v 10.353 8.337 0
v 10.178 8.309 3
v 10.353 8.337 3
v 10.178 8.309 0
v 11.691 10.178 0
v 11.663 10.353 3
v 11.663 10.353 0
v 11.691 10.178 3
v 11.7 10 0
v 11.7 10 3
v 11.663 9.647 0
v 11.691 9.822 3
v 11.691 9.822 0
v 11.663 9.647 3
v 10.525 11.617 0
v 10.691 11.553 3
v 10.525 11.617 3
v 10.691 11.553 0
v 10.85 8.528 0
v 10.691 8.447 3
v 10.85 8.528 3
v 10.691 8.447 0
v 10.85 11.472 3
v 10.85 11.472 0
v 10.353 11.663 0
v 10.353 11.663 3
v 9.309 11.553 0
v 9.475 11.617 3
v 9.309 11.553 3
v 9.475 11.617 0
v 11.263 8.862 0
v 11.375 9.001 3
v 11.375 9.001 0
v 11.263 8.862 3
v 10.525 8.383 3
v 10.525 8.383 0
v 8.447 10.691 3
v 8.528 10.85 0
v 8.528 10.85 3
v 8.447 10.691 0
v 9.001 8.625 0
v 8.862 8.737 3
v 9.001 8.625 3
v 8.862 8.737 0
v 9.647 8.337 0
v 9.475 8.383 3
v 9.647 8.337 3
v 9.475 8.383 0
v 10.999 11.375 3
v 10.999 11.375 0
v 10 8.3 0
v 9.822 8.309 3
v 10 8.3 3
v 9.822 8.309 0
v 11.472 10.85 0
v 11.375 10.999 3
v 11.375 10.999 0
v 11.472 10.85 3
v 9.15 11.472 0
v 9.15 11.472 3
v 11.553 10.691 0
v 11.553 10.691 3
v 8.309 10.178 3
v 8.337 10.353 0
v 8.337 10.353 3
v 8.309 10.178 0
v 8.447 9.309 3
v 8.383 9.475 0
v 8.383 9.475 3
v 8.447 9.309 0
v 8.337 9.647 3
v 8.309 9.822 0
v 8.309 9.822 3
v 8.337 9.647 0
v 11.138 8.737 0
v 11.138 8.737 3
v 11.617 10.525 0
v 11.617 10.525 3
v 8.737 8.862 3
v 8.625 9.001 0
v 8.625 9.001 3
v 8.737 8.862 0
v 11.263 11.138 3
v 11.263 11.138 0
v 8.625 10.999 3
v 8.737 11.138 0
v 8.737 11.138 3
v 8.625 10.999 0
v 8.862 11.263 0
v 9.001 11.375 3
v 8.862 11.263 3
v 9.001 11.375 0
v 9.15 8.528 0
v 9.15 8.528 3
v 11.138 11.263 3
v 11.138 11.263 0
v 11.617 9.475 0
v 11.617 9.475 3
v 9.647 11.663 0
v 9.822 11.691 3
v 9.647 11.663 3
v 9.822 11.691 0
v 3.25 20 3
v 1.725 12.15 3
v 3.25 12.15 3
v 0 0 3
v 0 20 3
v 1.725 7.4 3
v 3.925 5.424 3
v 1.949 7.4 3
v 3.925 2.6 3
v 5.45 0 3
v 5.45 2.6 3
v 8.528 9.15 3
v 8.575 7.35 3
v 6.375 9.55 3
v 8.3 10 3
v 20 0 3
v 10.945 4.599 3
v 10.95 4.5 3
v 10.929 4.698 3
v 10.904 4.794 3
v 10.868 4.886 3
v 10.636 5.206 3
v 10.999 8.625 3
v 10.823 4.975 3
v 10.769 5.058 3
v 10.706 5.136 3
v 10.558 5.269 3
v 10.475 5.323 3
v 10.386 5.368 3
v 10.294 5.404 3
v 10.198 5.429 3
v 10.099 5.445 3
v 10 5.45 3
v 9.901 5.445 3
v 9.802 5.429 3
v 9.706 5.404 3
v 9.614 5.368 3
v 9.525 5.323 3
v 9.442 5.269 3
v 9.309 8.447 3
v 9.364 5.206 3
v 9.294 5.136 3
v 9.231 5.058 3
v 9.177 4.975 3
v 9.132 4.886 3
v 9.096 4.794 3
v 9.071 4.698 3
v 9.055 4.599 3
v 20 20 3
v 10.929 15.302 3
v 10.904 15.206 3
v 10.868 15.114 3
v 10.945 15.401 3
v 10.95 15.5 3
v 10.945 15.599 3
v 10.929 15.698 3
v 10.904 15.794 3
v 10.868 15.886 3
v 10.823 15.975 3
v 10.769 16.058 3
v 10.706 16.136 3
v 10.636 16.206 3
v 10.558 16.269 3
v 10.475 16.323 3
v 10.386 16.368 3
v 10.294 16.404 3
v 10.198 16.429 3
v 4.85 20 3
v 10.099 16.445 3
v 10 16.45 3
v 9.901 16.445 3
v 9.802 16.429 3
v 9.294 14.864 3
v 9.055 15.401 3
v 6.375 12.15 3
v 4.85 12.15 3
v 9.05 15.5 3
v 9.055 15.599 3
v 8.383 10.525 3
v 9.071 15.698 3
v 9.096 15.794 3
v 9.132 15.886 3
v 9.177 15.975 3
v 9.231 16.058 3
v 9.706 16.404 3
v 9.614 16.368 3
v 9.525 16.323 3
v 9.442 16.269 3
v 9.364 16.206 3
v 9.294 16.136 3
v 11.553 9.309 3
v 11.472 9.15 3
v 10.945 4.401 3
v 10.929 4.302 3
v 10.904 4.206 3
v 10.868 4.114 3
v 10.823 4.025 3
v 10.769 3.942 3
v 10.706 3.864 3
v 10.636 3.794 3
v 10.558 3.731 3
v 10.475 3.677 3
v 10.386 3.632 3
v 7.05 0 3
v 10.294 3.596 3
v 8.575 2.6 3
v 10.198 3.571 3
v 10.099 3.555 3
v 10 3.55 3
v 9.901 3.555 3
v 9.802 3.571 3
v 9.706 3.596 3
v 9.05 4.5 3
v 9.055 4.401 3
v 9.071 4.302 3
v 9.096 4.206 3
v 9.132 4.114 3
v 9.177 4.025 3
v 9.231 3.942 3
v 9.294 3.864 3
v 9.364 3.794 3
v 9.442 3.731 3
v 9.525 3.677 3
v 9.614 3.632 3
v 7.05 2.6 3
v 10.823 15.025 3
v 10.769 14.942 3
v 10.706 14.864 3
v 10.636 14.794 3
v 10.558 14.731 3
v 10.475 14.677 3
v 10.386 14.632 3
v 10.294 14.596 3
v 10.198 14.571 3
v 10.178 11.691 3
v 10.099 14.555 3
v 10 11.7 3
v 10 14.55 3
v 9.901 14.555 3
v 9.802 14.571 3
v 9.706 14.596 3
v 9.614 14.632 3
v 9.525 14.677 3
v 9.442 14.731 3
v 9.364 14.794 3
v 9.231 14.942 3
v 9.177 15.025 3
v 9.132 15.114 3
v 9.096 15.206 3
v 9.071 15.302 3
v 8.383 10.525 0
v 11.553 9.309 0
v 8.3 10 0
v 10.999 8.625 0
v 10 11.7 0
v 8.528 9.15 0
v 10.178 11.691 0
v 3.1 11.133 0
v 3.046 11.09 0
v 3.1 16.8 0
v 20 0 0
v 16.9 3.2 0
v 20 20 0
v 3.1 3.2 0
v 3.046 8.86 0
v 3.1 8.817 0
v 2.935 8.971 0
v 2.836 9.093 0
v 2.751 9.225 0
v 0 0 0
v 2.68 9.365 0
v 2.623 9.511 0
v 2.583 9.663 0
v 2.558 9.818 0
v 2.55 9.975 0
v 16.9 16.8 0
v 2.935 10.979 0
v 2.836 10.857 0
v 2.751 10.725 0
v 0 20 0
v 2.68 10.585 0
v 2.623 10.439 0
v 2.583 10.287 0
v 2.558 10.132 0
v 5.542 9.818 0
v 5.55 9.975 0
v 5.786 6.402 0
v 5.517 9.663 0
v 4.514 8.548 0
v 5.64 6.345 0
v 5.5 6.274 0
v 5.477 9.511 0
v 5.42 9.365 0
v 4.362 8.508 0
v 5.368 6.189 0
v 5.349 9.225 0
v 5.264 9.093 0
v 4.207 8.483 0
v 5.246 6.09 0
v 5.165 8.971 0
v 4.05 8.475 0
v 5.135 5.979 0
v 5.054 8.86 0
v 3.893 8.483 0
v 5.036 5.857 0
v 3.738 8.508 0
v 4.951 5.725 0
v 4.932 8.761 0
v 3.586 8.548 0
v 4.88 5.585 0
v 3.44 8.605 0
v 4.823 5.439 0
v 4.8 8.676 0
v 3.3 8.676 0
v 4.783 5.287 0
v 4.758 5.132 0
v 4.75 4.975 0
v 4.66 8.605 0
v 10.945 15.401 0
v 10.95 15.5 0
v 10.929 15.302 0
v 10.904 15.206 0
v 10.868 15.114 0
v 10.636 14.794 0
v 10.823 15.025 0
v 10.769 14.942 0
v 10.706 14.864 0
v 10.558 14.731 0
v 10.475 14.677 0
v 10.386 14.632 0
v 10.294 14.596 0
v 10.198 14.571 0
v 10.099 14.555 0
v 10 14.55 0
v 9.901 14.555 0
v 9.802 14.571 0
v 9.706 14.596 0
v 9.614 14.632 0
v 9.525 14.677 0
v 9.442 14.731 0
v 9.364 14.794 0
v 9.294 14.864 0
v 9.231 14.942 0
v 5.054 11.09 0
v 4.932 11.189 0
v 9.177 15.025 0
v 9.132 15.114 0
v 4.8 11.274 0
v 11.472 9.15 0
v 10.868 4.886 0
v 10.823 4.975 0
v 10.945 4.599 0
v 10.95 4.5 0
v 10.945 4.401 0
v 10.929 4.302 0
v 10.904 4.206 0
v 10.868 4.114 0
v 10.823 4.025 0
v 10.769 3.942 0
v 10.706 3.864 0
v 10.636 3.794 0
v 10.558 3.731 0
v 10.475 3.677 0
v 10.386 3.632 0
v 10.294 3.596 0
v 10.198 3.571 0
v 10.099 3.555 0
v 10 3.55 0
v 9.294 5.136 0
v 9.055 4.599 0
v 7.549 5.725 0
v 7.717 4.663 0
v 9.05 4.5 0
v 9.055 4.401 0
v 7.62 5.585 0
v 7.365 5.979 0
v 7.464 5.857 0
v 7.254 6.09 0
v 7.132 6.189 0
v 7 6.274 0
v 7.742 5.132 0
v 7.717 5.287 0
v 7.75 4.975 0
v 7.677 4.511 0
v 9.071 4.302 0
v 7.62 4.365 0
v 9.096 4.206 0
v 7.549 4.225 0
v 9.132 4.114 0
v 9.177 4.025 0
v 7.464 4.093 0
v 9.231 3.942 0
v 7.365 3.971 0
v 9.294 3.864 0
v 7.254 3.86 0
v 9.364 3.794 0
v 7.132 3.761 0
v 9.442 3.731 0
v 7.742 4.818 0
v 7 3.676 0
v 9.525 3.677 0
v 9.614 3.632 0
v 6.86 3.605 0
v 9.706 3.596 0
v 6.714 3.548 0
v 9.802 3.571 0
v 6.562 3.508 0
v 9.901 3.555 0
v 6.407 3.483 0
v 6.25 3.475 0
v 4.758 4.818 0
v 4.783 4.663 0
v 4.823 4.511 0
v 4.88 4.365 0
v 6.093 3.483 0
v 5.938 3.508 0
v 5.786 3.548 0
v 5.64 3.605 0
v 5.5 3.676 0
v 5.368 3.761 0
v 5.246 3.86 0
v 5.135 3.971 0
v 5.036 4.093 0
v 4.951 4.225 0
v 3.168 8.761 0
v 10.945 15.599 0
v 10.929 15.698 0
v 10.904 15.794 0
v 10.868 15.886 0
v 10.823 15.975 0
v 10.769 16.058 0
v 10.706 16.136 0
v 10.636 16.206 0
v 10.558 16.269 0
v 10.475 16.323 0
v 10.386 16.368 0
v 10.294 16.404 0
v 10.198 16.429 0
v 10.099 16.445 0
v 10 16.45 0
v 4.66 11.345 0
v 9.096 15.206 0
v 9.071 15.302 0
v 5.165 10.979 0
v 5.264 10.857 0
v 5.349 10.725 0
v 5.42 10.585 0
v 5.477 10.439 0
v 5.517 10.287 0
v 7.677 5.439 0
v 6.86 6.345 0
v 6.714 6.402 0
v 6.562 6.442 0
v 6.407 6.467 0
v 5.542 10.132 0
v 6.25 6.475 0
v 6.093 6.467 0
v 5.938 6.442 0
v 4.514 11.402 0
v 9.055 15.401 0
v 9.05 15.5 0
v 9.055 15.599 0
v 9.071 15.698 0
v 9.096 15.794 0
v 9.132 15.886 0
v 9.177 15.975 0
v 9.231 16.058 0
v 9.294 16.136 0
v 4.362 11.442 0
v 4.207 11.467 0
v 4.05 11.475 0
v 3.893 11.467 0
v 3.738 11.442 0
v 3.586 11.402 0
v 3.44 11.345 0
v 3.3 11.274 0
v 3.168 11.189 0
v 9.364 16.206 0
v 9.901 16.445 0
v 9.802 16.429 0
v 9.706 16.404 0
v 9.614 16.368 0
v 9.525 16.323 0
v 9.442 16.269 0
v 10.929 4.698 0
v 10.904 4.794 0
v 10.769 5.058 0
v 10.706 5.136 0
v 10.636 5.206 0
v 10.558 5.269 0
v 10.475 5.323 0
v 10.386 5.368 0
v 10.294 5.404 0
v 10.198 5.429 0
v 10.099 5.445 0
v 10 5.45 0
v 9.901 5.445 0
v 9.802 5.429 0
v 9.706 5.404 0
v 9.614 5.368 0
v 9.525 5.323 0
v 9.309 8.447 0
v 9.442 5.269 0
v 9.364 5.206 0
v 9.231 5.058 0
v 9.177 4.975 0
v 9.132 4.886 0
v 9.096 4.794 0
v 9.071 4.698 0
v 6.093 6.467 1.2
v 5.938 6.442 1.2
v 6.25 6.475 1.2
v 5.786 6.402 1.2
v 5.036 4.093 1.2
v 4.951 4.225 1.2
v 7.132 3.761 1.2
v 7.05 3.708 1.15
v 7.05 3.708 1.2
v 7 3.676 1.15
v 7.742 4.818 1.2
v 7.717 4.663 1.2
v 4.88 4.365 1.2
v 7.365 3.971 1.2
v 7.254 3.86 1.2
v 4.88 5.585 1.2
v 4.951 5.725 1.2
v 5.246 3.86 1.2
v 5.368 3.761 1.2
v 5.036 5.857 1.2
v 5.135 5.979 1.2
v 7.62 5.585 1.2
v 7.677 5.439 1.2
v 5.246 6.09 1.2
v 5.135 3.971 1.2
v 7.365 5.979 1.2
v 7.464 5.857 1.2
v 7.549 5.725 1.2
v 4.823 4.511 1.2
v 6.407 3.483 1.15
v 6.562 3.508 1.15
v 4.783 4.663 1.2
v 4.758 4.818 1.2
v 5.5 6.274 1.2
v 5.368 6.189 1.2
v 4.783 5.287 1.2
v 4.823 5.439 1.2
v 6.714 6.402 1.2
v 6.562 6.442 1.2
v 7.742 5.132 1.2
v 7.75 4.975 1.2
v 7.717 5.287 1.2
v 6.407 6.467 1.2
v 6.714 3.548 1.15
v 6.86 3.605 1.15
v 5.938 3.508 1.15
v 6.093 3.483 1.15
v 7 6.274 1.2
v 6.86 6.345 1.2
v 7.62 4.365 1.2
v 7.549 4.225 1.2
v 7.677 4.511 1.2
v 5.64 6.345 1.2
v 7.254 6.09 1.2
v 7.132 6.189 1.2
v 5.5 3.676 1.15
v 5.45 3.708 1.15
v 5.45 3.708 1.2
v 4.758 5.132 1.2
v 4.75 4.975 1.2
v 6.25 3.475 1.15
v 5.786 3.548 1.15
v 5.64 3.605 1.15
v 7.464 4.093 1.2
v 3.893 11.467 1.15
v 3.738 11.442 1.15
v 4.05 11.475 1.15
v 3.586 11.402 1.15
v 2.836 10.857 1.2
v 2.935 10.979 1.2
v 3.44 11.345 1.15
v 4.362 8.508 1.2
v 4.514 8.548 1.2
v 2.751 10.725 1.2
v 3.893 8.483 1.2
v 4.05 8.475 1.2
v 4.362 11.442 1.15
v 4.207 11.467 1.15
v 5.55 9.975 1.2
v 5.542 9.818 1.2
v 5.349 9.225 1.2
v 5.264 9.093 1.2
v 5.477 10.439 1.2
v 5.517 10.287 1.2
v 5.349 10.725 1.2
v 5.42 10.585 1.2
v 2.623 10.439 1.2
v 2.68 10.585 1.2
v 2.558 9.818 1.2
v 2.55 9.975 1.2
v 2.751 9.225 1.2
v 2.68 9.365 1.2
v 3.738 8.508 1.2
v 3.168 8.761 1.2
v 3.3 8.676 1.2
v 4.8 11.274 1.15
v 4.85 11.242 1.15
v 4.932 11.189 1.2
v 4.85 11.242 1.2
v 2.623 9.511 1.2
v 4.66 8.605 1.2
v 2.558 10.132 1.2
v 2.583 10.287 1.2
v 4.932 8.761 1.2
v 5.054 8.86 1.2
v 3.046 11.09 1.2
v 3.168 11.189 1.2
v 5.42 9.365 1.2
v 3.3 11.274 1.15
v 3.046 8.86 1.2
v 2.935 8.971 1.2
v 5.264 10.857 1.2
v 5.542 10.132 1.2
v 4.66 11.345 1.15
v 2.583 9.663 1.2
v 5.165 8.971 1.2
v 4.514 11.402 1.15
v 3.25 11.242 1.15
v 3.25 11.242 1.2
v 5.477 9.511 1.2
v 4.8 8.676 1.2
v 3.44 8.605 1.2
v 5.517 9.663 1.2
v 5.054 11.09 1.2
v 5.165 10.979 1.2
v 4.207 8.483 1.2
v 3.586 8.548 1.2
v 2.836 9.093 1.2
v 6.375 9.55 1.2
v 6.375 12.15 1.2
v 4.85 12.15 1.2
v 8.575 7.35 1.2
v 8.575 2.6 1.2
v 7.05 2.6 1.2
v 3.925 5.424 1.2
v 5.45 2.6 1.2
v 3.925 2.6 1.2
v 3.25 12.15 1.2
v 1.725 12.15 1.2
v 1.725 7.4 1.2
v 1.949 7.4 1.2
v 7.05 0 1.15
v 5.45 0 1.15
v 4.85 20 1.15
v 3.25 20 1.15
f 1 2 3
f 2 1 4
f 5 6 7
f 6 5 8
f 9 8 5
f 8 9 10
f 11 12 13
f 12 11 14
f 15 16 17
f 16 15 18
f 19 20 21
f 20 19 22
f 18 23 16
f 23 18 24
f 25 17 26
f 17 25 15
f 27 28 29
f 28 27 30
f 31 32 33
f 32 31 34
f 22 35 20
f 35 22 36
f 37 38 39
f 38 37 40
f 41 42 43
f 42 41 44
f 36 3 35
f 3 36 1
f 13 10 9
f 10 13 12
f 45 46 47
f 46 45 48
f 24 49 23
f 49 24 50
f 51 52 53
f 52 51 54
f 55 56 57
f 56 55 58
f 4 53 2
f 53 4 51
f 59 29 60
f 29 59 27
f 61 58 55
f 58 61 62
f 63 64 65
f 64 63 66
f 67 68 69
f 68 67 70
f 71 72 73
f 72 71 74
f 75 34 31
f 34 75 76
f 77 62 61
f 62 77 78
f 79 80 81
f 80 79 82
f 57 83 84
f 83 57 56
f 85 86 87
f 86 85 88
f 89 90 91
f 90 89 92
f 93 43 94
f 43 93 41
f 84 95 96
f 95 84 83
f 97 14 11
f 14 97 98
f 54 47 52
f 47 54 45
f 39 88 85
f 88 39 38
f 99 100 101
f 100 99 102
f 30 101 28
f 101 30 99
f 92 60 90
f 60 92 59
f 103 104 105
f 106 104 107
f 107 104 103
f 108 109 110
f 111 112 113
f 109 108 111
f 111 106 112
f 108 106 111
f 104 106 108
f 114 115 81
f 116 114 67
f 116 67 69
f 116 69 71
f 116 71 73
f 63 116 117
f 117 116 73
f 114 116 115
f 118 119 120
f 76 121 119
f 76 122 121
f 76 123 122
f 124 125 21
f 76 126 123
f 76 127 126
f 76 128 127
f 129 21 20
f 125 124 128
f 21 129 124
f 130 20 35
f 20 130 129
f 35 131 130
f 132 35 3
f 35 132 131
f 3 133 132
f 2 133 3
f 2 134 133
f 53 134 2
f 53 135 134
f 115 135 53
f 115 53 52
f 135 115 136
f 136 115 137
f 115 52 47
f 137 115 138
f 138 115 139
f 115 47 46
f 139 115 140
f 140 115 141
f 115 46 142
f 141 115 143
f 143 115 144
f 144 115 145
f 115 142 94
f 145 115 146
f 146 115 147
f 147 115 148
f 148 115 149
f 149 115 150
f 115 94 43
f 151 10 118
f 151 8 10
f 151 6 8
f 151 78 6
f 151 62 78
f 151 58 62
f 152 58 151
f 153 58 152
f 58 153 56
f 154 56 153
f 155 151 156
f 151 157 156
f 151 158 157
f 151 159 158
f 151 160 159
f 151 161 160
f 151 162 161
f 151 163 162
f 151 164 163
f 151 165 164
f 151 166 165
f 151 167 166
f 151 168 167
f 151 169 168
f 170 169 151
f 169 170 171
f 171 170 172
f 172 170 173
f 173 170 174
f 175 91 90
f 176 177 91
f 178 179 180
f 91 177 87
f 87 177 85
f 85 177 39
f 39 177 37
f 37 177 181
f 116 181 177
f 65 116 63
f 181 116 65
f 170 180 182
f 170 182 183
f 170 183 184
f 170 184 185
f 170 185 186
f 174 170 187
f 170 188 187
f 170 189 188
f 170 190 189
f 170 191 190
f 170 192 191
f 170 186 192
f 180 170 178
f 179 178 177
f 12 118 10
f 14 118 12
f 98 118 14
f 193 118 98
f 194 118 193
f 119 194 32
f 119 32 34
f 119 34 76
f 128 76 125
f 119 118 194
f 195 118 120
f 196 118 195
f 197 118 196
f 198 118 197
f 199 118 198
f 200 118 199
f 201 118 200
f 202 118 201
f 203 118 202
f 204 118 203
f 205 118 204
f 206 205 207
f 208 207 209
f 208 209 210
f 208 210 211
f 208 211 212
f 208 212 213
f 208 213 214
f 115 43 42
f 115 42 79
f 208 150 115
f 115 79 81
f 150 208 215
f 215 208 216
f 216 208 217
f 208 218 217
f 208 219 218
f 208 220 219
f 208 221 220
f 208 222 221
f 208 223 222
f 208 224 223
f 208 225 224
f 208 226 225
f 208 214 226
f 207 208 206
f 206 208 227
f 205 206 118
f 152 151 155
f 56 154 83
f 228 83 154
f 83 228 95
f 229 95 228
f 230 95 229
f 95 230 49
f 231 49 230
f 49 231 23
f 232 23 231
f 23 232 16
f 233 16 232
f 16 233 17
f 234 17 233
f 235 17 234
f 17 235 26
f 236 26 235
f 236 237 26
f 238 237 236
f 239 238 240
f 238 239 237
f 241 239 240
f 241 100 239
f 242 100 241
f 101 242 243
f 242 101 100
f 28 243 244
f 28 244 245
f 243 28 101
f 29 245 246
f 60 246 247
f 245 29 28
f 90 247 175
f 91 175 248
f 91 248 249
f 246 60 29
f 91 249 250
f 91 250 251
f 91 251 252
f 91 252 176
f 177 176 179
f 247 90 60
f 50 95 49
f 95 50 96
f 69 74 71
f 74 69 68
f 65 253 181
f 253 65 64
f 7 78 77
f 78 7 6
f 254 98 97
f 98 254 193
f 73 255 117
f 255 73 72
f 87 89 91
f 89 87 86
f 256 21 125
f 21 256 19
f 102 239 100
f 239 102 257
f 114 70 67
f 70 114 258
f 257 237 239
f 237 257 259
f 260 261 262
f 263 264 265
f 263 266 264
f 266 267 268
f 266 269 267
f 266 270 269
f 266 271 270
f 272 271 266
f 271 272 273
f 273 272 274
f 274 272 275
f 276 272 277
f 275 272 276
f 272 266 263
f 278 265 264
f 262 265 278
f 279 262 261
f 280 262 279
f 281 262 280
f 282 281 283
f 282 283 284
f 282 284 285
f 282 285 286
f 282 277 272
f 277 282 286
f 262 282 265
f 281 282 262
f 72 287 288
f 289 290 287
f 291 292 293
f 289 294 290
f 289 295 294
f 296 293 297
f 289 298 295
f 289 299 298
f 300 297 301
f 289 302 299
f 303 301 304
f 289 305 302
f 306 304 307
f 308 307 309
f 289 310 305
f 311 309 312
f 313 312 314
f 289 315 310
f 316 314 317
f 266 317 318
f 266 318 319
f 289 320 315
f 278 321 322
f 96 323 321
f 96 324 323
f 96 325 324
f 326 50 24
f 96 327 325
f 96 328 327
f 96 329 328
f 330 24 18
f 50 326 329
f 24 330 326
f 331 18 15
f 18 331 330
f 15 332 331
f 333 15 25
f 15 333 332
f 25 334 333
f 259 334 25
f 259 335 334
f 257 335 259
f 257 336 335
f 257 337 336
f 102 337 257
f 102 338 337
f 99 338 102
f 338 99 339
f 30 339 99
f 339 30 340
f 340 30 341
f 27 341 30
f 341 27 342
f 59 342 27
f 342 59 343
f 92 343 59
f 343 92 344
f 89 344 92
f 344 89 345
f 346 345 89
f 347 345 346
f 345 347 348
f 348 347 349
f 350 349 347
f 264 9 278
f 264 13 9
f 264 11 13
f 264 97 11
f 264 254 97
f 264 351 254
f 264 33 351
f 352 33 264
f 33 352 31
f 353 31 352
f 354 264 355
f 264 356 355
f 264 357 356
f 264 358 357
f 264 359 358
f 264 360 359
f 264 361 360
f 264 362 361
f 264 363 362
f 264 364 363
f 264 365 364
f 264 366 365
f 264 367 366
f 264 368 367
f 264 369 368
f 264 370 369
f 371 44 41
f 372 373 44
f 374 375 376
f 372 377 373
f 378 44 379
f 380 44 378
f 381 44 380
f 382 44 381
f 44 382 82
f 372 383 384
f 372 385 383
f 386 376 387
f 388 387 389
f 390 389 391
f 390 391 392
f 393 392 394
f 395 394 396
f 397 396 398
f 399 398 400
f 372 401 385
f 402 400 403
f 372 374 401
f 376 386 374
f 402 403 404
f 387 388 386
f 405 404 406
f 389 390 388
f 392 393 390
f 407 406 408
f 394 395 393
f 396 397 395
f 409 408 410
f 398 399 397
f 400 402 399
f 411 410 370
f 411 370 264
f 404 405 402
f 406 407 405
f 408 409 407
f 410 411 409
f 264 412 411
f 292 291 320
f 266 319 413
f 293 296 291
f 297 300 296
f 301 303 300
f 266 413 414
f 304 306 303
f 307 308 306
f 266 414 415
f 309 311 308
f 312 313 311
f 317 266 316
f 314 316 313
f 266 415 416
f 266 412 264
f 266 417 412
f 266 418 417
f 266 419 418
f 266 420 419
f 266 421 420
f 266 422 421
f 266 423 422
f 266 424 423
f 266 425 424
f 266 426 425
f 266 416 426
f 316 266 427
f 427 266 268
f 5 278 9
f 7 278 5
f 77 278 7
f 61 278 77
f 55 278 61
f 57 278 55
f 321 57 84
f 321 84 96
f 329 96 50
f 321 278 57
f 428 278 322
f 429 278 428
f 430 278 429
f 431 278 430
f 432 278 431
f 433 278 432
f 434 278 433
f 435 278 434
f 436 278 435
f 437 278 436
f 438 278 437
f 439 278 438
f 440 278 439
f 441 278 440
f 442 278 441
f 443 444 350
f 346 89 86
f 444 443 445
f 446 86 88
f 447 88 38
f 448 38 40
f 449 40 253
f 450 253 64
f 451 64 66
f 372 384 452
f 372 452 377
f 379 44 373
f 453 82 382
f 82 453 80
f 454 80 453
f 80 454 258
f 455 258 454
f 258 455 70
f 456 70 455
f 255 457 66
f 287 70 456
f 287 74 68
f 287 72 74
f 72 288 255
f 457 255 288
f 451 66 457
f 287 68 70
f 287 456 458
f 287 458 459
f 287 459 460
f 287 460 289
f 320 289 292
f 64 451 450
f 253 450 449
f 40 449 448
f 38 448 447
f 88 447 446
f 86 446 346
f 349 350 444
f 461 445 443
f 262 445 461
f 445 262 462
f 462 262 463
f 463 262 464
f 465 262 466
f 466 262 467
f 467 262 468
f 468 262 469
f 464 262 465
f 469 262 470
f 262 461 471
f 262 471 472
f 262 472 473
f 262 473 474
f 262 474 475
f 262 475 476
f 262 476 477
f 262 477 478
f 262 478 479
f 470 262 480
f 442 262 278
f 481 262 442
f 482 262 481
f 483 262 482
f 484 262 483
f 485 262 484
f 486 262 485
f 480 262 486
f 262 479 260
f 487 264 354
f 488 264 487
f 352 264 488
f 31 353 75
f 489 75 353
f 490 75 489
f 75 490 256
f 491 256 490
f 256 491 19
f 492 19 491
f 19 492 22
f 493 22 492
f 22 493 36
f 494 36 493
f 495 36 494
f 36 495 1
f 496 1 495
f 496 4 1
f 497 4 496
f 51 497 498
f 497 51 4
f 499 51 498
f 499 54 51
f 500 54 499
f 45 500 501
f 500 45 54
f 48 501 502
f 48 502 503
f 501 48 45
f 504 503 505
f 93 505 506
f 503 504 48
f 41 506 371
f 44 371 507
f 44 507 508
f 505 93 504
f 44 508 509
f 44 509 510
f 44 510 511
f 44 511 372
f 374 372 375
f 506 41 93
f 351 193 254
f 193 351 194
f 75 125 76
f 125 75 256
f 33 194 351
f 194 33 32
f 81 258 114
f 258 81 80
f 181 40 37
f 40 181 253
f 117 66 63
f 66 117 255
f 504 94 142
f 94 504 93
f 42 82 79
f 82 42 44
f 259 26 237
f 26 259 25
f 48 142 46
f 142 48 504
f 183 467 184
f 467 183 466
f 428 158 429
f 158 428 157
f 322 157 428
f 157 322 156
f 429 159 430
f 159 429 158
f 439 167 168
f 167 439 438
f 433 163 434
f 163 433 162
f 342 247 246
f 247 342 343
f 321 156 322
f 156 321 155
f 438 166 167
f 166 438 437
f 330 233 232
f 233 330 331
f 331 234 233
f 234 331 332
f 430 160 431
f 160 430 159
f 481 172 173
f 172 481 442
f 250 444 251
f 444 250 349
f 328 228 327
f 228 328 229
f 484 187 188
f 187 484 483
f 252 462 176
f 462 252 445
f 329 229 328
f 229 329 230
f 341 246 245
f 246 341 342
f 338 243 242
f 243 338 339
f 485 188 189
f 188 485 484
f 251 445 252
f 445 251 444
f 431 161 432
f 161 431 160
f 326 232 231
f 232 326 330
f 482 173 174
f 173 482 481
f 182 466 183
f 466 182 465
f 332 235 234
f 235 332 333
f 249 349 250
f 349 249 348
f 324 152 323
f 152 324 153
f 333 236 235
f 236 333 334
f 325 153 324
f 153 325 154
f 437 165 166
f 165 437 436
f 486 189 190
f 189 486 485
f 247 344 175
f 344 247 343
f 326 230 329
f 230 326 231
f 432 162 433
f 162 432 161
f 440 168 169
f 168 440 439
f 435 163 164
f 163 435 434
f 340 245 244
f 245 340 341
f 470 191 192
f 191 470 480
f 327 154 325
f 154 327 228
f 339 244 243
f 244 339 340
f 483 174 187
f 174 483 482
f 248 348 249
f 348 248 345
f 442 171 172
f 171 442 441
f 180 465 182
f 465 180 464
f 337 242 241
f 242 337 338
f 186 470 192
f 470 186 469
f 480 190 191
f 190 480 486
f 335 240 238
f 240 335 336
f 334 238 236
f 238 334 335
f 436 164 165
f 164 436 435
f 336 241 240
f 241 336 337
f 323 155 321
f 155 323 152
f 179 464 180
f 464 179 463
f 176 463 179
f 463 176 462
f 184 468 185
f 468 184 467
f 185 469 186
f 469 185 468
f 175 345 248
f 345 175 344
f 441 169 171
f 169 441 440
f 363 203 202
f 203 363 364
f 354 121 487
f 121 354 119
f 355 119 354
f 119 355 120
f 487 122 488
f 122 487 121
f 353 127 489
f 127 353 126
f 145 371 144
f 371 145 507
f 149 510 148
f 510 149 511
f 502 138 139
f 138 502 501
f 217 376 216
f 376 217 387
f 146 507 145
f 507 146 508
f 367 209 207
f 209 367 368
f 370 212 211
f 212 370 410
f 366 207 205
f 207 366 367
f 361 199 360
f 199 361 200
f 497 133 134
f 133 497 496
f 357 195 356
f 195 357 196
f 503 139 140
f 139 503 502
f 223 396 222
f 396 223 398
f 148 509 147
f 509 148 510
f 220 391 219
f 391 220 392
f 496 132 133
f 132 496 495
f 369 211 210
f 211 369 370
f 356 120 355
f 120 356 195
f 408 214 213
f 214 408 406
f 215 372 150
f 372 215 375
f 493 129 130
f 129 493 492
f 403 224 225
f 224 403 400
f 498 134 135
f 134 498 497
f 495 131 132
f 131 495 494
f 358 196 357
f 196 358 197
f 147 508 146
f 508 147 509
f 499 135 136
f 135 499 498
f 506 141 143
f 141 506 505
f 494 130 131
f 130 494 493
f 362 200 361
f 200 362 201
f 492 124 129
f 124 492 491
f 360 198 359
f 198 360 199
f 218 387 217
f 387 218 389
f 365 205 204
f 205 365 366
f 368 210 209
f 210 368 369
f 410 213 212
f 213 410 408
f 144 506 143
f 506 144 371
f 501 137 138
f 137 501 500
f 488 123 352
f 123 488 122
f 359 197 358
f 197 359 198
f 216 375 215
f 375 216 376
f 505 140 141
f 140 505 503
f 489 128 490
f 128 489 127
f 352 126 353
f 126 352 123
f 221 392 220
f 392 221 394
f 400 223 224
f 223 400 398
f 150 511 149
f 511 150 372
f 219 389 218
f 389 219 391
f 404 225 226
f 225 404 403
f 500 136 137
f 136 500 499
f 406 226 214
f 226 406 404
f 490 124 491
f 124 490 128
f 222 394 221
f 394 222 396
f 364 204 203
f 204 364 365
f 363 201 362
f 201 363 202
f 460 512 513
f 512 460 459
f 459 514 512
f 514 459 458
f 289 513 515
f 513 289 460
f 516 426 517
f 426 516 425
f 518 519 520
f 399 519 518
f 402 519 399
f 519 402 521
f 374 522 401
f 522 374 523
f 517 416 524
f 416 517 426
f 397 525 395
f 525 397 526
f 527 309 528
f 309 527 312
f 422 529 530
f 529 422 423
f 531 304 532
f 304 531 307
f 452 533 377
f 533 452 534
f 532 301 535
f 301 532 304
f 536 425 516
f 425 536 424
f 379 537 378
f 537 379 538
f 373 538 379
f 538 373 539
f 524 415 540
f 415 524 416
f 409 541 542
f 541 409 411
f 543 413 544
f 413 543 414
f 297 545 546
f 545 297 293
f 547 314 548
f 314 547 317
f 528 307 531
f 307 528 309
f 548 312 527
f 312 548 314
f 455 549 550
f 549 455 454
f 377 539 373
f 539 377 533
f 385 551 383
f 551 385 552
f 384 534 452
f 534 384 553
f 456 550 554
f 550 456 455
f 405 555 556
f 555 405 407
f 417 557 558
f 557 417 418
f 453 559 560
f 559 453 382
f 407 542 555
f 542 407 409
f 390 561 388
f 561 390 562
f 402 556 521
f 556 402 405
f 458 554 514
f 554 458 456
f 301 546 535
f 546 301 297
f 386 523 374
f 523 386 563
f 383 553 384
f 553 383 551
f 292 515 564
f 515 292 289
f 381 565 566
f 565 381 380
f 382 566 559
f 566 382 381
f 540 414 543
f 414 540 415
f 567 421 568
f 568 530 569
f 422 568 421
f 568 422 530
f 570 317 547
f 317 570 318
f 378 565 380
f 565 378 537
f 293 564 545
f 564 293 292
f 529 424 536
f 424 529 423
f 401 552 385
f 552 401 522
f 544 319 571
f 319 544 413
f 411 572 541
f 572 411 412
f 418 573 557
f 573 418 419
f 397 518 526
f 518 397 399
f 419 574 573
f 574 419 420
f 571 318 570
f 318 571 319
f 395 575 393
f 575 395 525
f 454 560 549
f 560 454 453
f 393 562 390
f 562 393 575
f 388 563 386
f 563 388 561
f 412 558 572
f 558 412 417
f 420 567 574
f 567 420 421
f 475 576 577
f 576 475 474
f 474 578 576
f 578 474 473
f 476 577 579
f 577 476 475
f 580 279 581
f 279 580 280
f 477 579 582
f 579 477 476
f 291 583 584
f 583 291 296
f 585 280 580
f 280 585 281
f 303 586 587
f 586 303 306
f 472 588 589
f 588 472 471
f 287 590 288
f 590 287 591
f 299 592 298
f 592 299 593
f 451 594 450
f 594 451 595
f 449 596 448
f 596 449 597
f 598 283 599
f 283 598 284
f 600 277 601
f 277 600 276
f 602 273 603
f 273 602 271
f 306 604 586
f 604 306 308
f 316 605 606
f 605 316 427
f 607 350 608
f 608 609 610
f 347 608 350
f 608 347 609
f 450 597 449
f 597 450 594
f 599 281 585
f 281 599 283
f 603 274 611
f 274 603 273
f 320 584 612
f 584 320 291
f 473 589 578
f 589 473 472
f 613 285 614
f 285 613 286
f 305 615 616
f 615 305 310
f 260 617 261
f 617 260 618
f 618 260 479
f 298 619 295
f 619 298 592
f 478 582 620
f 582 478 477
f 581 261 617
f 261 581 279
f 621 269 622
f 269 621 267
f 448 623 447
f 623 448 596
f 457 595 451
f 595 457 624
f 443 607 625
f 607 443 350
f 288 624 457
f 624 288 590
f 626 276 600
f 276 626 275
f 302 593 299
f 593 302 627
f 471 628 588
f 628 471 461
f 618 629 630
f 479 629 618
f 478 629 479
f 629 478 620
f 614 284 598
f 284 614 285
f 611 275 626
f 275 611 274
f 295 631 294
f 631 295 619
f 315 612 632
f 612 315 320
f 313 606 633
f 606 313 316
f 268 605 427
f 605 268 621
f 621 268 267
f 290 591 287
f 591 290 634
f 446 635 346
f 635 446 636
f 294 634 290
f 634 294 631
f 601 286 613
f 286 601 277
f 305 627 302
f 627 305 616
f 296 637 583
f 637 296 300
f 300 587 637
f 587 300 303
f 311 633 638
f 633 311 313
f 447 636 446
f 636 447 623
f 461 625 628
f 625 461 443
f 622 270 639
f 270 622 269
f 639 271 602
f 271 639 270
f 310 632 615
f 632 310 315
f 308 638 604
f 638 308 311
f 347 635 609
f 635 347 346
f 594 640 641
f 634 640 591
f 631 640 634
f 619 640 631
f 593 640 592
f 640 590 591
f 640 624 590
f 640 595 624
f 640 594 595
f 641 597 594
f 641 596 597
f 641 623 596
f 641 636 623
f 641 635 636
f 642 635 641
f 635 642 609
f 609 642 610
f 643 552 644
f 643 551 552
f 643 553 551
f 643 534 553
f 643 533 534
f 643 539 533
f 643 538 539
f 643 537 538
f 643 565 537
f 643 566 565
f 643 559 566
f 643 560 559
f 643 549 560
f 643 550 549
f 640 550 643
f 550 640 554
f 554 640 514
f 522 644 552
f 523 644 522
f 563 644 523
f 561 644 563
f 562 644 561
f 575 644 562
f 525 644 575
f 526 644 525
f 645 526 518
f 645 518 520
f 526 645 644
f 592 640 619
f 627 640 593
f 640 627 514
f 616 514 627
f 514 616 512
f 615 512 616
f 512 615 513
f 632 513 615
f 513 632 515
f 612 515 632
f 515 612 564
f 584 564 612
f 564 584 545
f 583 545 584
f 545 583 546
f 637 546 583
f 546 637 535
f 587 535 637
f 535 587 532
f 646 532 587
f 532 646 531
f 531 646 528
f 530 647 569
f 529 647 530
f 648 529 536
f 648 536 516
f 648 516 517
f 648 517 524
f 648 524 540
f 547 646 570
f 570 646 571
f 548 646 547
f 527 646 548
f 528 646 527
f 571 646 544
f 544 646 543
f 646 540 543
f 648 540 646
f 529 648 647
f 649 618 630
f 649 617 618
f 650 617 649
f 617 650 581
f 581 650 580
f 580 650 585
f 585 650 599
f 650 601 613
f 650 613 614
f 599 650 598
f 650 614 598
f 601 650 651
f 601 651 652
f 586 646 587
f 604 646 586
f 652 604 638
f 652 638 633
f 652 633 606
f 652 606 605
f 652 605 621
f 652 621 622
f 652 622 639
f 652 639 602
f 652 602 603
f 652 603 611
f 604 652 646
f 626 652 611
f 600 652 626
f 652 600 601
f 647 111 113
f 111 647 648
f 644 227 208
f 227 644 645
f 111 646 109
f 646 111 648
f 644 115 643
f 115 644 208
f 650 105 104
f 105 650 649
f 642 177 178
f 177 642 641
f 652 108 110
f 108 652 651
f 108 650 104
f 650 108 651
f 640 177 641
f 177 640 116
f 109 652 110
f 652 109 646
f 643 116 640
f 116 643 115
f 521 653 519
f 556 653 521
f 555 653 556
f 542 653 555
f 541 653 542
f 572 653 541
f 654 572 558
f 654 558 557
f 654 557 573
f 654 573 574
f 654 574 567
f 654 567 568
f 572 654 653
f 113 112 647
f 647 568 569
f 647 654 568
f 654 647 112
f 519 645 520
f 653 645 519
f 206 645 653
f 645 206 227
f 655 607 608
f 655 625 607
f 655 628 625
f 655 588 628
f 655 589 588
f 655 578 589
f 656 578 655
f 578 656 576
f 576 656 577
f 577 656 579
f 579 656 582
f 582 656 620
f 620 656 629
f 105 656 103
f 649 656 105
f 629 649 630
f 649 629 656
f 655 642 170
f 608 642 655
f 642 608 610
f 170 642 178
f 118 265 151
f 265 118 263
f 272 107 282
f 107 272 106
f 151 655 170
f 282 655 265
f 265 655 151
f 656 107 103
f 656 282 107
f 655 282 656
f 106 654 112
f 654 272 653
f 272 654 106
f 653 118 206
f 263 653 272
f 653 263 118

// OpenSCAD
$fn=60;

//hotswap
cyl_h=3.05;
cyl_d=3;

base_x=4.75;
base_x_sum=9.55;
base_y=4.65;
base_y_sum=6.85;
base_z=1.8;

clip_x=1.68;
clip_y=(13.15-9.95)/2;
clip_z=1.85;

//based on:
//https://www.kailhswitch.com/Content/upload/pdf/201915927/CPG135001D03_-_White_Clicky_Choc.pdf  
module kailh_choc_switch(){
    color("orange")
    union(){
        cube([15,15,0.8]);
        translate([0.6,0.7,0.8])
        cube([13.8,13.6,2.2]);
        
        translate([7.5,7.5,3]){
            cylinder(h=3,d=3.4);
            
            translate([0,+5.5,0])
            cylinder(h=3,d=1.9);
            translate([0,-5.5,0])
            cylinder(h=3,d=1.9);
            
            //contacts
            translate([-5.9,0,0])
            cylinder(h=3,d=1.2);
            translate([-3.8,-5,0])
            cylinder(h=3,d=1.2);
        }
    }
}

//based on:
//https://www.kailhswitch.com/Content/upload/pdf/202115927/CPG135001S30-data-sheet.pdf
module kailh_hot_swap_choc(extend_cables=0){


    //fuck
    mirror([0,0,1])
    union(){
    //plastic
    color("darkgray"){
        cube([base_x,base_y,base_z]);
        
        translate([base_x_sum-base_x,base_y_sum-base_y,0])
        cube([base_x,base_y,base_z]);
        
        translate([base_x/2,base_y/2,0]){
            cylinder(h=cyl_h,d=cyl_d);
            translate([5,2.2,0])
            cylinder(h=cyl_h,d=cyl_d);
        }
        translate([base_x,0,0])
        rotate([0,0,45])
        cube([base_x,base_y,base_z]);
    }
    
    //metal
    color("gray"){
        translate([-clip_x-extend_cables,base_y/2-clip_y/2,0])
        cube([clip_x+base_y/2+extend_cables, clip_y, clip_z]);
        translate([base_x_sum-base_y/2,base_y_sum-base_y/2-clip_y/2,0])
        cube([clip_x+base_y/2+extend_cables, clip_y, clip_z]);
    }
    }
}

difference(){
cube([20,20,3]);
translate([2.5,2.5,0]){
    translate([0,0,-3])
    kailh_choc_switch();

    translate([7.5-3.8+base_y/2+.05,0.1,3])
    rotate([0,0,90])
    kailh_hot_swap_choc(10);
    }
}


//kailh_choc_switch();
